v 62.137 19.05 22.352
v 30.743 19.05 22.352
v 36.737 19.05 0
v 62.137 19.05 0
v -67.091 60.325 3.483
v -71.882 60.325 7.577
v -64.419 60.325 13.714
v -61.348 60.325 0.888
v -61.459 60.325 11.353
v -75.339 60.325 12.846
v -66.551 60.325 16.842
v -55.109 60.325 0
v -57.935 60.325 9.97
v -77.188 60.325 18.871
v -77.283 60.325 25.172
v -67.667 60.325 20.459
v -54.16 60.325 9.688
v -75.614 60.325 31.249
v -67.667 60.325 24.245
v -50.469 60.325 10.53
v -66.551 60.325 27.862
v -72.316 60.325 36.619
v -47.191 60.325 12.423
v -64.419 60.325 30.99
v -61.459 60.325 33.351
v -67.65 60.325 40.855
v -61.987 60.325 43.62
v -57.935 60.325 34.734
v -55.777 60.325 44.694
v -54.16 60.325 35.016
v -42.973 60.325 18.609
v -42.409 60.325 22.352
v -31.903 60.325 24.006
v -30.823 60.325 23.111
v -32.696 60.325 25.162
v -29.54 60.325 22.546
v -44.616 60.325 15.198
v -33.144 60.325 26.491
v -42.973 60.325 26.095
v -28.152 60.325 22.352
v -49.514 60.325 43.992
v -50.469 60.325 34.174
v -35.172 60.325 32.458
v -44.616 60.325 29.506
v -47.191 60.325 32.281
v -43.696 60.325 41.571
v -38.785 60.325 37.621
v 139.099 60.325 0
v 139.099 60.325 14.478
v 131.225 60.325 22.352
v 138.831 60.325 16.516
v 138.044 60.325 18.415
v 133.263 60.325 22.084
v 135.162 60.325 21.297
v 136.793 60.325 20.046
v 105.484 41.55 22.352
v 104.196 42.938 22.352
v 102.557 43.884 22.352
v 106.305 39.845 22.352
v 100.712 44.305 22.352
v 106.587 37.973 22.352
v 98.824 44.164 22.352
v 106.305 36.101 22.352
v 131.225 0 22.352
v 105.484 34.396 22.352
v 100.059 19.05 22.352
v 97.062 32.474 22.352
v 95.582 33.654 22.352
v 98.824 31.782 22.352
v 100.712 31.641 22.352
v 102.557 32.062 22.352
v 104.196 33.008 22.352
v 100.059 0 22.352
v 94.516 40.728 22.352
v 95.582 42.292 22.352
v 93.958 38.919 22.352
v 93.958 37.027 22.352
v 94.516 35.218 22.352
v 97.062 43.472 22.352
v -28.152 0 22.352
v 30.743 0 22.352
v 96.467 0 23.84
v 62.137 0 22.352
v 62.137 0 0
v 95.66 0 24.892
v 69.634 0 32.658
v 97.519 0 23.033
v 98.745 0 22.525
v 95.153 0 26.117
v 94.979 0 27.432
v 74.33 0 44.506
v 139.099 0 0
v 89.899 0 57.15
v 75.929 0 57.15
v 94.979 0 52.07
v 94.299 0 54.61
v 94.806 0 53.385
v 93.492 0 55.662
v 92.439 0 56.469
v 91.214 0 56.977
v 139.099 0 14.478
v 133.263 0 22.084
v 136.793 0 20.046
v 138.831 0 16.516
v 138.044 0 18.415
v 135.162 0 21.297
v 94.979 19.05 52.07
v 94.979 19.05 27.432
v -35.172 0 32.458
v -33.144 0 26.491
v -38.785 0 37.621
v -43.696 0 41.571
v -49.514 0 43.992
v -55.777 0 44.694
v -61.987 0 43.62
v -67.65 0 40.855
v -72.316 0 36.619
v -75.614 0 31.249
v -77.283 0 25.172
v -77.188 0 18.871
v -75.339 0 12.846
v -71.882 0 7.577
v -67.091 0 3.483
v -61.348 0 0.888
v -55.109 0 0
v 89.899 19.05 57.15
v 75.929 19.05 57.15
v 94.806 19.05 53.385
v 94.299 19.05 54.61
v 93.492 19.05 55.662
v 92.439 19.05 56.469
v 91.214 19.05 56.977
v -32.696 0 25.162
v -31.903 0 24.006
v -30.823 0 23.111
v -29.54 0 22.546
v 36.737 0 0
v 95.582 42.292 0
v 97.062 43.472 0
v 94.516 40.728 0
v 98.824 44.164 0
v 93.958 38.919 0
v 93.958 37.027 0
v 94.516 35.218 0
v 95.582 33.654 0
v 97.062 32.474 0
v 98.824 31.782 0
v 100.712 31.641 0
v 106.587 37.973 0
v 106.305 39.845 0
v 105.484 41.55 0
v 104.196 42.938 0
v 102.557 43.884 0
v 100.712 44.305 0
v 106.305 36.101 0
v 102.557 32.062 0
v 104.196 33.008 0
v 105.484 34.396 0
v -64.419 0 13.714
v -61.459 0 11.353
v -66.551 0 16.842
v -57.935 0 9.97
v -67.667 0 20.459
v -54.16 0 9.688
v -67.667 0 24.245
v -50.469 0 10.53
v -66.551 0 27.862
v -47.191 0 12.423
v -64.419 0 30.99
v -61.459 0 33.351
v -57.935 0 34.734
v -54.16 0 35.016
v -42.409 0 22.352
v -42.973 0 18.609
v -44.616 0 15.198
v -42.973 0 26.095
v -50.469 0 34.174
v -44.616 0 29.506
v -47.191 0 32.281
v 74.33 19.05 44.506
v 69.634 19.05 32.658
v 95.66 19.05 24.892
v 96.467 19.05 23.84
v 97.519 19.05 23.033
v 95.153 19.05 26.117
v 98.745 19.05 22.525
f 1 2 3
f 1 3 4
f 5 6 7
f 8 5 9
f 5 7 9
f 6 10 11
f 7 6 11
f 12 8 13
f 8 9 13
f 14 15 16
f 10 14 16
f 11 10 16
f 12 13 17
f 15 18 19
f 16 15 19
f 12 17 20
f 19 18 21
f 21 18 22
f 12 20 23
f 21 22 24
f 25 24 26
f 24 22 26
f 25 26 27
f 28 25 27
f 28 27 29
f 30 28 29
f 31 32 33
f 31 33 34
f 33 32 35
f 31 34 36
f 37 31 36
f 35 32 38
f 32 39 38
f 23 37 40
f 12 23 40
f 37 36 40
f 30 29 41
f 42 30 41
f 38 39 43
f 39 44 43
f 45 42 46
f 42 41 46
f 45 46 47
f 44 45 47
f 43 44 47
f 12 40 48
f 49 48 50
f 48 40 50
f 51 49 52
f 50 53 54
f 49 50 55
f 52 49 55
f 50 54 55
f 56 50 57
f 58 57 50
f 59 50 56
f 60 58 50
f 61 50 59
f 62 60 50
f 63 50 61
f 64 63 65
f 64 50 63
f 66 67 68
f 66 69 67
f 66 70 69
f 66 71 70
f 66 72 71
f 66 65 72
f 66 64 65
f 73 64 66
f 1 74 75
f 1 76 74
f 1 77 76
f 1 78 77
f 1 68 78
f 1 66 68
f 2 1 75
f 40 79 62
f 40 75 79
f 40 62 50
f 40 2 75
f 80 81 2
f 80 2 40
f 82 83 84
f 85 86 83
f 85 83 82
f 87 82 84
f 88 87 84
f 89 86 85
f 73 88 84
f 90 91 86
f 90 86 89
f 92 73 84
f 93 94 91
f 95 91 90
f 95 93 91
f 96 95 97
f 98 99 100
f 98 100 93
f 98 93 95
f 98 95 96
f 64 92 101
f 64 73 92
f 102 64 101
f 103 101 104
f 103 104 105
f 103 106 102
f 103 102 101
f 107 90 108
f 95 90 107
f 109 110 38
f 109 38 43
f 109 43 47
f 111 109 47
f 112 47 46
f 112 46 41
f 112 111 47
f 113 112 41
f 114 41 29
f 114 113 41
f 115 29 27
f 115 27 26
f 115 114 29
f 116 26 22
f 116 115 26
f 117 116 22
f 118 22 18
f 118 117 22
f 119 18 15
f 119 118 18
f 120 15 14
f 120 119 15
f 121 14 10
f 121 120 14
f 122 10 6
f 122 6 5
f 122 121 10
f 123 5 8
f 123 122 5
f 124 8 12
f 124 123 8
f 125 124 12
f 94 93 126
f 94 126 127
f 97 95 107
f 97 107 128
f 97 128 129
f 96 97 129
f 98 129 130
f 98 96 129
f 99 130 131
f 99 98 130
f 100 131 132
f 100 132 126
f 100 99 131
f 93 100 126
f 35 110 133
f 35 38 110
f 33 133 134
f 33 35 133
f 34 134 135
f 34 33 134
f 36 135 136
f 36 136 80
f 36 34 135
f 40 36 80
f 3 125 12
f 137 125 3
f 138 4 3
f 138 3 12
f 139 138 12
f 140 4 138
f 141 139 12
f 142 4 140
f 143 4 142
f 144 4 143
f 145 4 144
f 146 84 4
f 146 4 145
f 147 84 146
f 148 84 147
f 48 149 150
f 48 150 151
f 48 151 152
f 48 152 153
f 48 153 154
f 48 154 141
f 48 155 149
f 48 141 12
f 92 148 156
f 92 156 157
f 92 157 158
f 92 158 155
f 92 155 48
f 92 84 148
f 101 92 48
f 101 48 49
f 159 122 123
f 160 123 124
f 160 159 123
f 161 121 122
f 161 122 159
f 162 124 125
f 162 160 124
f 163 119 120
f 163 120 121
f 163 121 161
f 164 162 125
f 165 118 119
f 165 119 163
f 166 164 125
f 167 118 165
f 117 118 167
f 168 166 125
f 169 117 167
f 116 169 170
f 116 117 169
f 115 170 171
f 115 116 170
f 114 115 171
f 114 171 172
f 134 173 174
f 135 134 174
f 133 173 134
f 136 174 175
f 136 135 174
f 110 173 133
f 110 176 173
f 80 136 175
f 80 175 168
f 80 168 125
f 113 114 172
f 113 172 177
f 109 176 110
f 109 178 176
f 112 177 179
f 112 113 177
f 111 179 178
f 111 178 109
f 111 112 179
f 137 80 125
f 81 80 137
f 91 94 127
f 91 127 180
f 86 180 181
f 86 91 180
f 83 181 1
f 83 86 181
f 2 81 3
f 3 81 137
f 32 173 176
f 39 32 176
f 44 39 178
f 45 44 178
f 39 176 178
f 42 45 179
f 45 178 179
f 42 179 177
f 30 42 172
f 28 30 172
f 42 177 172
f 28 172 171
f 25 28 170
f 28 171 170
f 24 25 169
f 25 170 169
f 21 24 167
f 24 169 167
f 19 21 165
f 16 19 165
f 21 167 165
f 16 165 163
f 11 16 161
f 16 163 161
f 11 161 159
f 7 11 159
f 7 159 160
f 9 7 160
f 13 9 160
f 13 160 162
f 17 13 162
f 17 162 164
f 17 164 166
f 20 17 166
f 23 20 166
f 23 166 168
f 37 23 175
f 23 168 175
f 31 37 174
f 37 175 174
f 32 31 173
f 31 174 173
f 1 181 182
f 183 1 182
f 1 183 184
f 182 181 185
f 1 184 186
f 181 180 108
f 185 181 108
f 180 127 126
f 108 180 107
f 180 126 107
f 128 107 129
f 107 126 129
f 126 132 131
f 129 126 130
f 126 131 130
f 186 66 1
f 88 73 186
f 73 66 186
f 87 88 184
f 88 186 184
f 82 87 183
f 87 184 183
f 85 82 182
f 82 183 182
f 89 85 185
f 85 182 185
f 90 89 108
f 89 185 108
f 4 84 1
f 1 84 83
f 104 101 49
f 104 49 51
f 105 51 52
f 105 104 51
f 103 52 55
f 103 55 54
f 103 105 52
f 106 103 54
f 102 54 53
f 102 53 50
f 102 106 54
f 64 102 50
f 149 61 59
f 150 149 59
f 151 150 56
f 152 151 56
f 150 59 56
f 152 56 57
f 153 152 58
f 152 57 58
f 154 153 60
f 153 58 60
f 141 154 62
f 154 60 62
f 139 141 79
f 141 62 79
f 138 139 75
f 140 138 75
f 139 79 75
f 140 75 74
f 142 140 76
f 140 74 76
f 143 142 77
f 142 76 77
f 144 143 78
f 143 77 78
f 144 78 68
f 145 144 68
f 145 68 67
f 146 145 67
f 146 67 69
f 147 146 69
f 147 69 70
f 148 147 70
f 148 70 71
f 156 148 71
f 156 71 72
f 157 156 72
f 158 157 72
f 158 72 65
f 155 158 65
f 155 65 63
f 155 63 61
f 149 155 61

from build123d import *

# Parameters (mm, degrees)
F0_R     = 12.7
F1_DEPTH = 60.325
F2_DEPTH = 19.05
F3_DEPTH = 19.05
F4_R     = 5.08
F5_R     = 6.35
F6_DEPTH = 25.4


with BuildPart() as f1:
    # F0 (on Front) → F1 (new body)
    with BuildSketch(Plane.XZ):
        with BuildLine():
            ThreePointArc((-55.109176, 0), (-39.303925, 6.546749), (-32.757176, 22.352))
            ThreePointArc((-32.757176, 22.352), (-70.914426, 38.157251), (-55.109176, 0))
        make_face()
        with Locations((-55.109176, 22.352)):
            Circle(F0_R, mode=Mode.SUBTRACT)
        with BuildLine():
            Line((30.742824, 22.352), (-32.757176, 22.352))
            ThreePointArc((-32.757176, 22.352), (-39.303925, 6.546749), (-55.109176, 0))
            Line((-55.109176, 0), (36.737224, 0))
            Line((36.737224, 0), (30.742824, 22.352))
        make_face()
        Polygon((62.137224, 22.352), (30.742824, 22.352), (36.737224, 0), (62.137224, 0), align=None)
        with BuildLine():
            Line((94.979424, 22.352), (62.137224, 22.352))
            Line((62.137224, 22.352), (62.137224, 0))
            Line((62.137224, 0), (139.099224, 0))
            Line((139.099224, 0), (139.099224, 14.478))
            ThreePointArc((139.099224, 14.478), (136.792983, 20.045759), (131.225224, 22.352))
            Line((131.225224, 22.352), (94.979424, 22.352))
        make_face()
    extrude(amount=-F1_DEPTH)

    # F0 (on Front) → F2 (join)
    with BuildSketch(Plane.XZ):
        with BuildLine():
            ThreePointArc((75.929424, 57.15), (72.35524, 38.434358), (62.137224, 22.352))
            Line((62.137224, 22.352), (94.979424, 22.352))
            Line((94.979424, 22.352), (94.979424, 52.07))
            ThreePointArc((94.979424, 52.07), (93.491527, 55.662102), (89.899424, 57.15))
            Line((89.899424, 57.15), (75.929424, 57.15))
        make_face()
    extrude(amount=-F2_DEPTH)

    # F0 (on Front) → F3 (cut)
    with BuildSketch(Plane.XZ):
        Polygon((62.137224, 22.352), (30.742824, 22.352), (36.737224, 0), (62.137224, 0), align=None)
    extrude(amount=-F3_DEPTH, mode=Mode.SUBTRACT)

    # F4
    f4_edges = [f1.edges().sort_by_distance(p)[0] for p in [
        (-32.757176, 30.1625, 22.352),
        (94.979424, 9.525, 22.352),
    ]]
    fillet(f4_edges, radius=F4_R)

    # F5 (on face) → F6 (cut)
    with BuildSketch(Plane.XY.offset(22.352)):
        with Locations((100.237224, 37.973)):
            Circle(F5_R)
    extrude(amount=-F6_DEPTH, mode=Mode.SUBTRACT)


solid = f1.part
